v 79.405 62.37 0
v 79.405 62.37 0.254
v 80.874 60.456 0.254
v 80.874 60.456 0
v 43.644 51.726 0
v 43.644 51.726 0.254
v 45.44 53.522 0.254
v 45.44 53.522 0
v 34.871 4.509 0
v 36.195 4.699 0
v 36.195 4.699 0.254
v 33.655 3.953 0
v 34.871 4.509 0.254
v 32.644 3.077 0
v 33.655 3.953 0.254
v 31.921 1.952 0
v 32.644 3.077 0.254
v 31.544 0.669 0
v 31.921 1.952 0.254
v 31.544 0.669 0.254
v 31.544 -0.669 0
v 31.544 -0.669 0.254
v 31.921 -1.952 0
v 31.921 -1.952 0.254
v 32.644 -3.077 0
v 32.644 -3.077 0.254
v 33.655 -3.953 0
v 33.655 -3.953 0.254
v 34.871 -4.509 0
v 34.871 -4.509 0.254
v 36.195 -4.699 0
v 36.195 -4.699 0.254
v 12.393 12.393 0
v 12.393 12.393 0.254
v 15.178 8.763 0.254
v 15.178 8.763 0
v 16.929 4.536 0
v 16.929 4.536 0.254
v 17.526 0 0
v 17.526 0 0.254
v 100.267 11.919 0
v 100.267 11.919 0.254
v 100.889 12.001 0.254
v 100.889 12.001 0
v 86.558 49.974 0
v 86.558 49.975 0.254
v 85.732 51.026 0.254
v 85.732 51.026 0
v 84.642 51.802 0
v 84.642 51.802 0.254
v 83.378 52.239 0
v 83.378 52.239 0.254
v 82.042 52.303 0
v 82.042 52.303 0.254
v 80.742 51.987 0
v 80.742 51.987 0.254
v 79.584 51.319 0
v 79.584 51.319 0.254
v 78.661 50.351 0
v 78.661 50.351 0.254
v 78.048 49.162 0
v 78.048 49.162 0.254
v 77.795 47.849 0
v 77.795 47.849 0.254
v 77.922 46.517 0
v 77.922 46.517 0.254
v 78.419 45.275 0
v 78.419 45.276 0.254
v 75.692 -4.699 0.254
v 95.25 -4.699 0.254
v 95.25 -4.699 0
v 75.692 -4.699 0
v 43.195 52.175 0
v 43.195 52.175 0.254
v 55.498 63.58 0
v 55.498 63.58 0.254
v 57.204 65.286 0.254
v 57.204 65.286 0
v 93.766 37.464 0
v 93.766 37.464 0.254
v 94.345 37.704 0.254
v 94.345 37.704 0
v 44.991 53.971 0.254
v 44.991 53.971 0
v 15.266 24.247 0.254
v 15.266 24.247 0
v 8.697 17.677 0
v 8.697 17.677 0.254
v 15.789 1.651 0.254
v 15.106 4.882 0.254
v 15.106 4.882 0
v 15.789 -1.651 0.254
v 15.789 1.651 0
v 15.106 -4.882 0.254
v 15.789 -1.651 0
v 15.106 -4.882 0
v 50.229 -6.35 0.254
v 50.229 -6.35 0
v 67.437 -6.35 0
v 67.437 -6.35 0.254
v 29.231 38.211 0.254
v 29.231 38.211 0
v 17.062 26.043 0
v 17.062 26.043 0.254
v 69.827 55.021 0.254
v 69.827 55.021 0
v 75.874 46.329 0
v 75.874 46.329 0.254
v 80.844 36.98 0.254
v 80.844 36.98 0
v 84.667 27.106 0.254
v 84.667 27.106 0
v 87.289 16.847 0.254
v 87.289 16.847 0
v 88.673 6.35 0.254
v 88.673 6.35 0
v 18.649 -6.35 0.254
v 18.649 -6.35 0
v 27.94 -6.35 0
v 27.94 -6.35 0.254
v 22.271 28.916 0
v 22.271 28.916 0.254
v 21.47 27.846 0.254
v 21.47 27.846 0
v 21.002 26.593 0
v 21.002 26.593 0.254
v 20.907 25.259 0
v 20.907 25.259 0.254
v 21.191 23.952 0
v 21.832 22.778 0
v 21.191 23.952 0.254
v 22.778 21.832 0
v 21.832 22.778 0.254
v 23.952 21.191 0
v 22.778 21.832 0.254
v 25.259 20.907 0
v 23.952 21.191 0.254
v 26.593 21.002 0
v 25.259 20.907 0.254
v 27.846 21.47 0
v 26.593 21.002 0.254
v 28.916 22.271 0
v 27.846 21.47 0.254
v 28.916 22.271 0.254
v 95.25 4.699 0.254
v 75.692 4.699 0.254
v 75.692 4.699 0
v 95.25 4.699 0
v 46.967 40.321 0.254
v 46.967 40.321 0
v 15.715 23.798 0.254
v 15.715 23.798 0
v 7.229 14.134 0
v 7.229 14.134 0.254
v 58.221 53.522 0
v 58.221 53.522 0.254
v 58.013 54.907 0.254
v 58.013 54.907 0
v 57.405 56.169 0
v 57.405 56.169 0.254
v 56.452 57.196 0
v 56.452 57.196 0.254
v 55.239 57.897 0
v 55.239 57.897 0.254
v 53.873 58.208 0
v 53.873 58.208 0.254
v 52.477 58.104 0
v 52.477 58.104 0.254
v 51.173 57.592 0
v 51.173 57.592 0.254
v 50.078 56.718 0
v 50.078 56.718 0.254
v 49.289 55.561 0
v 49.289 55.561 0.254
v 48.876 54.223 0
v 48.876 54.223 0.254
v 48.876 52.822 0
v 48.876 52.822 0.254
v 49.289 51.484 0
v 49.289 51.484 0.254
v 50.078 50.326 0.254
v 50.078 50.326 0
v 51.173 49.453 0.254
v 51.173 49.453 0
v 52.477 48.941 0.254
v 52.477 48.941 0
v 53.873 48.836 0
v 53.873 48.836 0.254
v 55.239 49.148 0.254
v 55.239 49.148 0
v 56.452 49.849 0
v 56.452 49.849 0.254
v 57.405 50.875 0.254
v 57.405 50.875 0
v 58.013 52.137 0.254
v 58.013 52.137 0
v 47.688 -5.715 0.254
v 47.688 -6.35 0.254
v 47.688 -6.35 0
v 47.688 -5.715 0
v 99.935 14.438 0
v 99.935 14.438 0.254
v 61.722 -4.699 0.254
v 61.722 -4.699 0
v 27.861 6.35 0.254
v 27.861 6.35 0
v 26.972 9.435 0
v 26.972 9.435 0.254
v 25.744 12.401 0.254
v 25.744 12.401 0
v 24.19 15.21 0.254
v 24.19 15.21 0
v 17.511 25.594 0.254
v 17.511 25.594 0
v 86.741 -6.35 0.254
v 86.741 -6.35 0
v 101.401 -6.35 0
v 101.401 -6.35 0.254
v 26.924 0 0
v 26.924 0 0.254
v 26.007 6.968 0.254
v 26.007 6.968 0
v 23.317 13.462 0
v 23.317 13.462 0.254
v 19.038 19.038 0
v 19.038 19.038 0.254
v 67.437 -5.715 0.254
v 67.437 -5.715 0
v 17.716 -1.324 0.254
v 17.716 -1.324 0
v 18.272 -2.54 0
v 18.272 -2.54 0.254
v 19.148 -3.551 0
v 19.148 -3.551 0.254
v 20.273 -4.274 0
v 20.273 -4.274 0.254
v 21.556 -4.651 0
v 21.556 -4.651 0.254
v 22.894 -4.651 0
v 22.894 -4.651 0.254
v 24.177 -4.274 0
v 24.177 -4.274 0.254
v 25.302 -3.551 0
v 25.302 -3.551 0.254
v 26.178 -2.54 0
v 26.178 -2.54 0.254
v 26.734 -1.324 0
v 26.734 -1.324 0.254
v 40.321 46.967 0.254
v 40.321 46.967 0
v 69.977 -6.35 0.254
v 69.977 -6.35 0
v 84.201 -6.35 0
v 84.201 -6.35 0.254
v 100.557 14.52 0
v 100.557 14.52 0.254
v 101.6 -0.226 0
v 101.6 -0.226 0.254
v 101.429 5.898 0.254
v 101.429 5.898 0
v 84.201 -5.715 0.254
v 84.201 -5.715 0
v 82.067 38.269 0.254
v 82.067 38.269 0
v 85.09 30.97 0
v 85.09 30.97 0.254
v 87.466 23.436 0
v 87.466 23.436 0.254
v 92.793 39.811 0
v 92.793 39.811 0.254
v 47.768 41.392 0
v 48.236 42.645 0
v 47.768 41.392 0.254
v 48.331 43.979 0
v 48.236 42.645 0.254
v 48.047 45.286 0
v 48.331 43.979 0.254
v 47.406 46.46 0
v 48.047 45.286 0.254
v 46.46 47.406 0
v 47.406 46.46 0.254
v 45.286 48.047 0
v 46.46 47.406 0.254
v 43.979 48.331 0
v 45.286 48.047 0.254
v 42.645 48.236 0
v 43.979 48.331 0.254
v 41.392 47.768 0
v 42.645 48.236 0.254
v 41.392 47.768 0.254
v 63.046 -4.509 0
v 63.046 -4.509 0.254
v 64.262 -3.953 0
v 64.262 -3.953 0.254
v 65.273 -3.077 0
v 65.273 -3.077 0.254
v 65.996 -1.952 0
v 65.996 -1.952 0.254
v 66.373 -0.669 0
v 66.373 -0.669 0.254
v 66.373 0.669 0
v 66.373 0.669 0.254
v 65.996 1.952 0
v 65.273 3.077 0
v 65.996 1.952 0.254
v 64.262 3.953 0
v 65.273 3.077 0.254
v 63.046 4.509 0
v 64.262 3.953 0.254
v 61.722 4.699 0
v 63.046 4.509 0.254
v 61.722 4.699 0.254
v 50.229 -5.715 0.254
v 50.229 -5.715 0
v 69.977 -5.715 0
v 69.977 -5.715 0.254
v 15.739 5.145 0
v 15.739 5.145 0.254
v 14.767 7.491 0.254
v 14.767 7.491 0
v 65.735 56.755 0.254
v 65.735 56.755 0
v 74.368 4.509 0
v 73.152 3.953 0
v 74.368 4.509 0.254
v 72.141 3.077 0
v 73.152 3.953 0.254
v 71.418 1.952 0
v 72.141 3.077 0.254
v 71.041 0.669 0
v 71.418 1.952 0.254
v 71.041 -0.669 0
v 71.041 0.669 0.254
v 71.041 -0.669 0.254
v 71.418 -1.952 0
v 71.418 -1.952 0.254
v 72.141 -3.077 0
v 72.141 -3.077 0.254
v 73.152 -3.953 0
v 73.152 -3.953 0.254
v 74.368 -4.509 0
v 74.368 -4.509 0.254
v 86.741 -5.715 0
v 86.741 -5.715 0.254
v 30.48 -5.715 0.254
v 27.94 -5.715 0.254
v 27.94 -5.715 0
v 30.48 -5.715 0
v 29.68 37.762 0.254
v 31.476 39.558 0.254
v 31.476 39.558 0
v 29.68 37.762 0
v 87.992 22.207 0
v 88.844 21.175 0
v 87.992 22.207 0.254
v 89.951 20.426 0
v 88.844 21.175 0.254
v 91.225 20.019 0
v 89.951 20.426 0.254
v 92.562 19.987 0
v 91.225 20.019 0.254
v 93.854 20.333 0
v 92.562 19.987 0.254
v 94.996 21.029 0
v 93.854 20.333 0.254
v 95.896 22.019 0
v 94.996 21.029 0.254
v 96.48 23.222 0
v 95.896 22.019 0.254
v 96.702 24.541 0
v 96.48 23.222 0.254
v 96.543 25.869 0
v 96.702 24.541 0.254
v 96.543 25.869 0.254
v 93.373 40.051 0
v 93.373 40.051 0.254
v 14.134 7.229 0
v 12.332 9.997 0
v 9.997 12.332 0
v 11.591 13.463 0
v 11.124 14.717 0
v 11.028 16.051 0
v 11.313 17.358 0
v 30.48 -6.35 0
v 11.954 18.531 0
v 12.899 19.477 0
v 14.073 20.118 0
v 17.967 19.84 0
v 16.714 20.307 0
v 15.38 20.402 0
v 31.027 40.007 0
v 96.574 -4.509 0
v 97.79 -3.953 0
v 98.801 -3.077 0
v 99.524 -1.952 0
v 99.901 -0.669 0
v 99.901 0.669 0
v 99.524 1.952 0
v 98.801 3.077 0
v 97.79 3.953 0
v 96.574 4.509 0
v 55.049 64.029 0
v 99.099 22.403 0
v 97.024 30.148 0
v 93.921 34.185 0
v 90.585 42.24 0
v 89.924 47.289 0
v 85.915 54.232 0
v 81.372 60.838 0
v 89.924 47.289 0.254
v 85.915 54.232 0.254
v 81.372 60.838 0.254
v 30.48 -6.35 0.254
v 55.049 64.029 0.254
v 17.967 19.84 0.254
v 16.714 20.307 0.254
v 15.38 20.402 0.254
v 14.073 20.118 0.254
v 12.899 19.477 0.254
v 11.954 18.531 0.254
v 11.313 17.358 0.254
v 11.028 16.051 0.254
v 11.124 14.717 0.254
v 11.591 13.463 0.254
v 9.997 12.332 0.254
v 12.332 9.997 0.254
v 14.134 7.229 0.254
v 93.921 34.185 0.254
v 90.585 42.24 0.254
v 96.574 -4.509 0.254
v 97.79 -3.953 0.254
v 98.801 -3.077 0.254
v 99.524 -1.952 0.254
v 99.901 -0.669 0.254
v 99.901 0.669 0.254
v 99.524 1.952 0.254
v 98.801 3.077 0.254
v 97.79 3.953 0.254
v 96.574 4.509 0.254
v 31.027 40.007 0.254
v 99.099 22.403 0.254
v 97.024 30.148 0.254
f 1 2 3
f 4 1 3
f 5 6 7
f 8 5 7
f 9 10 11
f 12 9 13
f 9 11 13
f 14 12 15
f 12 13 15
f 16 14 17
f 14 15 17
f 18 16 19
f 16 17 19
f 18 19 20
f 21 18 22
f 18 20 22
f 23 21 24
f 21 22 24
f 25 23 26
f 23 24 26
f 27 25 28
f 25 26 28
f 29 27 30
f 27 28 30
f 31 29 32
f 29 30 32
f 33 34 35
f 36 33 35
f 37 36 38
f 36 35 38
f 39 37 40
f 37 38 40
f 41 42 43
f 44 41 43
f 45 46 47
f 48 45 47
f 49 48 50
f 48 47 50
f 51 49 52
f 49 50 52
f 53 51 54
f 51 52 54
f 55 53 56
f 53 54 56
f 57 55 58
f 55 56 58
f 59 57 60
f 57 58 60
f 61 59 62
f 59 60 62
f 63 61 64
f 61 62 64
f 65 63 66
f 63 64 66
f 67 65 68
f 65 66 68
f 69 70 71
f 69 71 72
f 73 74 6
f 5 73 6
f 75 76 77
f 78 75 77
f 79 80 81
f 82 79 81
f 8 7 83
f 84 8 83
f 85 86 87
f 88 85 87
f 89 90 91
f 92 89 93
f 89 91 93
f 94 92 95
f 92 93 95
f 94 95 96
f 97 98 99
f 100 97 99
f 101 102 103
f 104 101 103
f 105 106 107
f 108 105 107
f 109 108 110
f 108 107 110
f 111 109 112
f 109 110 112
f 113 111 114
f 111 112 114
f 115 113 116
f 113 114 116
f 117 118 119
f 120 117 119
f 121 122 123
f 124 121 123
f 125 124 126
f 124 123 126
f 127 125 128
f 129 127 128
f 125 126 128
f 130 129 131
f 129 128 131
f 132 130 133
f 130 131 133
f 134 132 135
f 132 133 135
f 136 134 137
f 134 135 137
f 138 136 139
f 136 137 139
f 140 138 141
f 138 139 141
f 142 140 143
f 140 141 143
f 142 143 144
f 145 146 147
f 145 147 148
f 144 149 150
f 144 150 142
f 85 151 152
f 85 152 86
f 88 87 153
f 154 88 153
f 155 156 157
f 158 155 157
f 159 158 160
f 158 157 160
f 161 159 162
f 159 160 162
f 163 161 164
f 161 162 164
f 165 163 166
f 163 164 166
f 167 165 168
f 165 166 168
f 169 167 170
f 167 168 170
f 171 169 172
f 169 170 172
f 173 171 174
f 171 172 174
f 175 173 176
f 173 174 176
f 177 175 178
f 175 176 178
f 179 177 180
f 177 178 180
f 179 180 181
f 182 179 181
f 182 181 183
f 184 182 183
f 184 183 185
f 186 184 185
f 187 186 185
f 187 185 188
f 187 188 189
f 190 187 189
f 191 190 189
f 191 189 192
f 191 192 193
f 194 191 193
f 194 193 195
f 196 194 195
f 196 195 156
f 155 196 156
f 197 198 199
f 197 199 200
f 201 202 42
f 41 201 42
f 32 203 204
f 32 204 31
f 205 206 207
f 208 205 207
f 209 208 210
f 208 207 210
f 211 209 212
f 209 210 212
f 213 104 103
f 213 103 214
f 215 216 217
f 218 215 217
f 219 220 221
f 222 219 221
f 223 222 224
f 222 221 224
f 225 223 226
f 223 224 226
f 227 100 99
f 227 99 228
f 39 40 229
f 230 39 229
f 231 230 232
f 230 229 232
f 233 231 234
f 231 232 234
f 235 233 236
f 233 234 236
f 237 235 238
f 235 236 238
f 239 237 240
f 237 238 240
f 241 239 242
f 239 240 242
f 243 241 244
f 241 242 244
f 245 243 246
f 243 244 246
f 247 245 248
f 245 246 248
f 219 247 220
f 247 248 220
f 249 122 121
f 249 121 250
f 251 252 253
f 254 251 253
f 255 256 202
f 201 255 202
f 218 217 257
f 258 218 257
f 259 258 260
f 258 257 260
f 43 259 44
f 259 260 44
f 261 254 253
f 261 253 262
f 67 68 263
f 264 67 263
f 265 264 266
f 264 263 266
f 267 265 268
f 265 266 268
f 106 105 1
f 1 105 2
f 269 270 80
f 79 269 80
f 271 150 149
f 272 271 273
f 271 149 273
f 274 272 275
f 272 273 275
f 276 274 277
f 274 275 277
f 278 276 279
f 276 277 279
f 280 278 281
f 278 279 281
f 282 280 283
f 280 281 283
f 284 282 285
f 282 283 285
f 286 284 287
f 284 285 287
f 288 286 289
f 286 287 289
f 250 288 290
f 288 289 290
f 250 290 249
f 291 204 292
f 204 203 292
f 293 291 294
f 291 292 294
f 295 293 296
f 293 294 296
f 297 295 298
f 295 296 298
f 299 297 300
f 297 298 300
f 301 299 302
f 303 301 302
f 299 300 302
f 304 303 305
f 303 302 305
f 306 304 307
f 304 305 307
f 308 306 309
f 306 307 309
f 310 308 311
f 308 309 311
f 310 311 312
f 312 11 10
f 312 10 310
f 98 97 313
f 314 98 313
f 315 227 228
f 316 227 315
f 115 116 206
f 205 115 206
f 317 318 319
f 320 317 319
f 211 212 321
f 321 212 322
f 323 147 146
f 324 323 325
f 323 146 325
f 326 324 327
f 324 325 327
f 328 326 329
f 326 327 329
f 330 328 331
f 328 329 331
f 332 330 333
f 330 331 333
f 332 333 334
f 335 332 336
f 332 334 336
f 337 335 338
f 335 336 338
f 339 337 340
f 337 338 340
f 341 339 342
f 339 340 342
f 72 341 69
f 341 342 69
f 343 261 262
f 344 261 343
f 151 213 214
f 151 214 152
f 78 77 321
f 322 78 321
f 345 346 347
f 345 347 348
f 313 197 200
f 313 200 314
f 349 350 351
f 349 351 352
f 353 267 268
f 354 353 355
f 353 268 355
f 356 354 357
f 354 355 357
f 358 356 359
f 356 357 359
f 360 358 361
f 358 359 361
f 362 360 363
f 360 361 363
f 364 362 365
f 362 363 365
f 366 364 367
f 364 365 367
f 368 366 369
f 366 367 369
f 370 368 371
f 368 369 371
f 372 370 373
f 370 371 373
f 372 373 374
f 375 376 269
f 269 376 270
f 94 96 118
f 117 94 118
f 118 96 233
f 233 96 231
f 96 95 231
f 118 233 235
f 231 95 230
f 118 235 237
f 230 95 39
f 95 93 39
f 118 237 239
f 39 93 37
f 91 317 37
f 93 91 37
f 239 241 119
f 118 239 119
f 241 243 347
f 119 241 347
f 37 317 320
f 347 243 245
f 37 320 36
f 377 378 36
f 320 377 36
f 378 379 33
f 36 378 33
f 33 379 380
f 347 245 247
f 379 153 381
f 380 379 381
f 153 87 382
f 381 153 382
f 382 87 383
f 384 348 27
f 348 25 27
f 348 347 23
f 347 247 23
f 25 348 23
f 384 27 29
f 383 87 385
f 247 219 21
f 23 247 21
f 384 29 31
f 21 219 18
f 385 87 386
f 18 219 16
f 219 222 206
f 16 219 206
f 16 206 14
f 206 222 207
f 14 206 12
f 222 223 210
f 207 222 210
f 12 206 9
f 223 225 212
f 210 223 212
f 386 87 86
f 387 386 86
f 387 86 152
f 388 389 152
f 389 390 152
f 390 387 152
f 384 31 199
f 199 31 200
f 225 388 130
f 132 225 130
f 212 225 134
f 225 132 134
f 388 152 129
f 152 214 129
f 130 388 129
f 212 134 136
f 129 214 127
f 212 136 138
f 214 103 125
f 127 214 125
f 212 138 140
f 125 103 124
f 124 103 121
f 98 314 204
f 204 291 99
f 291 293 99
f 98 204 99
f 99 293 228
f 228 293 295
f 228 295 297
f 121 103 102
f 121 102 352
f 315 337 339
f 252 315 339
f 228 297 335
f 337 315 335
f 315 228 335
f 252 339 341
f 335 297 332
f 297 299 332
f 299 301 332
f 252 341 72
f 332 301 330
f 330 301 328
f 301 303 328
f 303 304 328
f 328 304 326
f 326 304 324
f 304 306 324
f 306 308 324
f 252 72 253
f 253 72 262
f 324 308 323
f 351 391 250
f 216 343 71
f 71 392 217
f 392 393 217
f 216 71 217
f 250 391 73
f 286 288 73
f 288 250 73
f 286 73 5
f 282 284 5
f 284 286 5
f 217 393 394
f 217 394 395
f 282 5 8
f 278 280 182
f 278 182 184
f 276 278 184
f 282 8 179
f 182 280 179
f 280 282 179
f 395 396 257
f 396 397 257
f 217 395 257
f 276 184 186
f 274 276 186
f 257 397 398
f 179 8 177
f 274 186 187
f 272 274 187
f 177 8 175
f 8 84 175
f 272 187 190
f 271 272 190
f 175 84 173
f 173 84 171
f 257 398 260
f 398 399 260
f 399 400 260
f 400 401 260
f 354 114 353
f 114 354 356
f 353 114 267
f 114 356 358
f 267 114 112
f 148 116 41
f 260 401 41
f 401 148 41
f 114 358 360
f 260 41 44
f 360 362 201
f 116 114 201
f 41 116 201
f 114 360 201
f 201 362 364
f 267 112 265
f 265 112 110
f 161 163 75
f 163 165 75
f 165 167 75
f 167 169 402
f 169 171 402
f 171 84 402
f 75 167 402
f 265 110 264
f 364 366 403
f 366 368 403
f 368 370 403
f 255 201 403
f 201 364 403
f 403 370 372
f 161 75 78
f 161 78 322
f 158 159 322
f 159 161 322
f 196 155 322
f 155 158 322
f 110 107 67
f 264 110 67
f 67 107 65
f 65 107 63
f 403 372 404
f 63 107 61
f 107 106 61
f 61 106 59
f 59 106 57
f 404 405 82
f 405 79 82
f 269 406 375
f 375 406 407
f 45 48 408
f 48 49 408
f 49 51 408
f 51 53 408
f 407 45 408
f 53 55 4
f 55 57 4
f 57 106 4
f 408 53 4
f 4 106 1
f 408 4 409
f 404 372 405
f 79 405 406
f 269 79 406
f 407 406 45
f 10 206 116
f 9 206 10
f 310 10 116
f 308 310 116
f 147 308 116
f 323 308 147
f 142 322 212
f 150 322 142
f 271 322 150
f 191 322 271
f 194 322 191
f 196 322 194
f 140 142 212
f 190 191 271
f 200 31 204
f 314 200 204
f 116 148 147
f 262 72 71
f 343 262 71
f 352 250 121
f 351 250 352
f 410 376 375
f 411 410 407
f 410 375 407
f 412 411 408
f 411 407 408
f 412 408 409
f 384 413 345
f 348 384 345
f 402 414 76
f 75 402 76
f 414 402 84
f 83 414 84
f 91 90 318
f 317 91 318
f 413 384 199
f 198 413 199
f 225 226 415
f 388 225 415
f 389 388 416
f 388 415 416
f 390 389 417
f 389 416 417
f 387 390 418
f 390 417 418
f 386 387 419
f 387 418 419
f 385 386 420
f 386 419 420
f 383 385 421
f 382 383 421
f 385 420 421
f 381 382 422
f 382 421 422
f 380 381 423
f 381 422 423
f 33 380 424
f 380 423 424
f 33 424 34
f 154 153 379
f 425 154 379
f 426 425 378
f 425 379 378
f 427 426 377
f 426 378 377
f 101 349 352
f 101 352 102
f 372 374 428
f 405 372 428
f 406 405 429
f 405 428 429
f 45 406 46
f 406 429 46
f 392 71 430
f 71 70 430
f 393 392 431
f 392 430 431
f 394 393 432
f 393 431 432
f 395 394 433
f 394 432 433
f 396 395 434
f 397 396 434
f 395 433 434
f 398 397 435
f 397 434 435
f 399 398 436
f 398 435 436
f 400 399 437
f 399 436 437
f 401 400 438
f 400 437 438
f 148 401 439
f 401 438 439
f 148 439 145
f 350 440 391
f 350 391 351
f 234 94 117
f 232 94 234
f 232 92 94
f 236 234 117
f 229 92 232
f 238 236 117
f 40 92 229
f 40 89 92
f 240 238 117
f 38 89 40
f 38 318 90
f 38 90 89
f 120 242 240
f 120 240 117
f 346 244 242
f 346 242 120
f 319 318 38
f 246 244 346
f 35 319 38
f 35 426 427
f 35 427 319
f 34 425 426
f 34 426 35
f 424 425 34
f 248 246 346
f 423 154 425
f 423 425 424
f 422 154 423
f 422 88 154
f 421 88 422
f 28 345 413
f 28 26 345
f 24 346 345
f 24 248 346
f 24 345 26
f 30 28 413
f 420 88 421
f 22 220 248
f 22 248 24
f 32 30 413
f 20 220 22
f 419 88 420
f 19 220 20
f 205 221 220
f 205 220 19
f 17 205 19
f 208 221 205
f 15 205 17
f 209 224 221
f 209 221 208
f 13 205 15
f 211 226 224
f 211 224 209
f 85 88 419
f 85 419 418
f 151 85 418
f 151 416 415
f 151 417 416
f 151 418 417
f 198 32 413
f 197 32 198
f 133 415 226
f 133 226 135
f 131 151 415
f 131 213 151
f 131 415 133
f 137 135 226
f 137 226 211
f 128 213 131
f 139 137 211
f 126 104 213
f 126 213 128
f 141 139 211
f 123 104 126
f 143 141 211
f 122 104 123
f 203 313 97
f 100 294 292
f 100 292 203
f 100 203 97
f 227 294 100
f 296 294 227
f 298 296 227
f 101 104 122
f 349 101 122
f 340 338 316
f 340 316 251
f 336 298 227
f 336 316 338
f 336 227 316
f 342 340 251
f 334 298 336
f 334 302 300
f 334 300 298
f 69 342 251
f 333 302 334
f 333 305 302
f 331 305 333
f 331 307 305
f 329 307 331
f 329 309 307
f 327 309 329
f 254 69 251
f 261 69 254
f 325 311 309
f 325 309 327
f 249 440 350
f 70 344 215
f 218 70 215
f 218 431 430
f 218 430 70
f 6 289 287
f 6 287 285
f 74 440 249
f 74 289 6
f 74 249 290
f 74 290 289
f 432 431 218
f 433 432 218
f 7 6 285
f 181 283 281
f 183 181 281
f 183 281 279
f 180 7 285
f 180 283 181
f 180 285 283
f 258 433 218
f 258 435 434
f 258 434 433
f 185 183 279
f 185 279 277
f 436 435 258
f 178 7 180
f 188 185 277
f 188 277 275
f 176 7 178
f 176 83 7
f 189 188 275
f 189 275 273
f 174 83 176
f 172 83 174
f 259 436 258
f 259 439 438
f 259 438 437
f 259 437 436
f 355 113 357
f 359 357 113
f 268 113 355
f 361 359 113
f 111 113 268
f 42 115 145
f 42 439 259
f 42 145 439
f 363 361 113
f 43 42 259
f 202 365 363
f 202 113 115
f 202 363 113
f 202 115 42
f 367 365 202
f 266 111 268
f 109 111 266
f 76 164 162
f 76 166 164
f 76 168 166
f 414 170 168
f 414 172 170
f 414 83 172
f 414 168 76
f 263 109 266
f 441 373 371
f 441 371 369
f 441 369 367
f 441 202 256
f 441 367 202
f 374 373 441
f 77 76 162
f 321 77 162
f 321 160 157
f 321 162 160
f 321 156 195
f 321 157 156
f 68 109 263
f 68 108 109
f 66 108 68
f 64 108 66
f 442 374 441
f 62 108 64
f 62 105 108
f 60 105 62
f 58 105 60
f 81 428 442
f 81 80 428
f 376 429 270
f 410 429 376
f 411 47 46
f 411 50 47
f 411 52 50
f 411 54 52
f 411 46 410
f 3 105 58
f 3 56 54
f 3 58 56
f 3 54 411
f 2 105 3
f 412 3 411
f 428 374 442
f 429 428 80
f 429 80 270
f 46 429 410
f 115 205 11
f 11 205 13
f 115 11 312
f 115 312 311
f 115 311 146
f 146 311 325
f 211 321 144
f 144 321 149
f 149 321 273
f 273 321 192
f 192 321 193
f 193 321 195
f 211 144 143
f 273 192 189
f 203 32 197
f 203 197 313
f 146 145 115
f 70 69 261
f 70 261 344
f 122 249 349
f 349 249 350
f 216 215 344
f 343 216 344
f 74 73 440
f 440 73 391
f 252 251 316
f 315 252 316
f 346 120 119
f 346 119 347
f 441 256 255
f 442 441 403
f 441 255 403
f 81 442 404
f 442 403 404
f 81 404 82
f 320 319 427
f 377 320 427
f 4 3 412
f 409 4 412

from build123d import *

# Parameters (mm, degrees)
BOSS_EXTRUDE1_DEPTH = 0.254
SKETCH2_R           = 4.699
CUT_EXTRUDE1_DEPTH  = 1.254
SKETCH3_W           = 2.54
SKETCH3_H           = 0.635
CUT_EXTRUDE2_DEPTH  = 1.254
CUT_EXTRUDE4_DEPTH  = 1.254
CUT_EXTRUDE5_DEPTH  = 1.254


with BuildPart() as part:
    # Sketch1 → Boss-Extrude1 (new body)
    with BuildSketch(Plane.XY):
        with BuildLine():
            Line((67.21146711, 76.191723231), (8.696654013, 17.676910134))
            Line((8.696654013, 17.676910134), (7.228954972, 14.133571205))
            ThreePointArc((7.228954972, 14.133571205), (14.666587579, 6.075099489), (15.105587123, -4.88230096))
            Line((15.105587123, -4.88230096), (18.648926052, -6.35))
            Line((18.648926052, -6.35), (101.401368334, -6.35))
            ThreePointArc((101.401368334, -6.35), (93.866160503, 38.880636728), (67.21146711, 76.191723231))
        make_face()
        with BuildLine():
            Line((88.672924278, 6.35), (27.86051193, 6.35))
            ThreePointArc((27.86051193, 6.35), (26.399857642, 10.93517908), (24.190484974, 15.210228852))
            Line((24.190484974, 15.210228852), (67.191354125, 58.211098004))
            ThreePointArc((67.191354125, 58.211098004), (82.13289044, 34.020557137), (88.672924278, 6.35))
        make_face(mode=Mode.SUBTRACT)
    extrude(amount=BOSS_EXTRUDE1_DEPTH)

    # Sketch2 → Cut-Extrude1 (cut, through all)
    with BuildSketch(Plane.XY.offset(0.254)):
        with Locations((22.225, 0)):
            Circle(SKETCH2_R)
        with Locations((36.195, 0)):
            Circle(SKETCH2_R)
        with Locations((61.722, 0)):
            Circle(SKETCH2_R)
        with Locations((75.692, 0)):
            Circle(SKETCH2_R)
        with Locations((95.25, 0)):
            Circle(SKETCH2_R)
        with Locations((15.715448212, 15.715448212)):
            Circle(SKETCH2_R)
        with Locations((25.593729945, 25.593729945)):
            Circle(SKETCH2_R)
        with Locations((43.644044748, 43.644044748)):
            Circle(SKETCH2_R)
        with Locations((53.522326482, 53.522326482)):
            Circle(SKETCH2_R)
        with Locations((92.004434954, 24.652514046)):
            Circle(SKETCH2_R)
        with Locations((82.48891971, 47.625)):
            Circle(SKETCH2_R)
        with Locations((67.351920908, 67.351920908)):
            Circle(SKETCH2_R)
    extrude(amount=-CUT_EXTRUDE1_DEPTH, mode=Mode.SUBTRACT)

    # Sketch3 → Cut-Extrude2 (cut, through all)
    with BuildSketch(Plane.XY.offset(0.254)):
        Polygon((15.266435406, 24.246691527), (17.06248663, 26.042742751), (17.511499436, 25.593729945), (15.715448212, 23.797678721), align=None)
        Polygon((44.991083167, 53.971339288), (43.195031942, 52.175288063), (43.644044748, 51.726275257), (45.440095973, 53.522326482), align=None)
        with Locations((29.21, -6.0325)):
            Rectangle(SKETCH3_W, SKETCH3_H)
        with Locations((68.707, -6.0325)):
            Rectangle(SKETCH3_W, SKETCH3_H)
        Polygon((29.230733674, 38.210989795), (31.026784898, 40.007041019), (31.475797704, 39.558028213), (29.67974648, 37.761976989), align=None)
        Polygon((56.845021246, 65.825277367), (55.048970022, 64.029226143), (55.497982828, 63.580213337), (57.294034052, 65.376264561), align=None)
        with Locations((48.9585, -6.0325)):
            Rectangle(SKETCH3_W, SKETCH3_H)
        with Locations((85.471, -6.0325)):
            Rectangle(SKETCH3_W, SKETCH3_H)
        Polygon((99.935462164, 14.437711971), (100.266998693, 11.919442024), (101.526133667, 12.085210288), (101.194597138, 14.603480236), align=None)
        Polygon((93.765504959, 37.464305742), (94.938831965, 37.950313702), (93.966816047, 40.296967714), (92.793489041, 39.810959755), align=None)
        Polygon((79.327792988, 62.471156422), (80.874047017, 60.456038938), (81.88160576, 61.229165953), (80.33535173, 63.244283437), align=None)
        Polygon((13.593916116, 7.005422516), (14.565932035, 4.658768503), (15.739259041, 5.144776462), (14.767243123, 7.491430475), align=None)
    extrude(amount=-CUT_EXTRUDE2_DEPTH, mode=Mode.SUBTRACT)

    # Sketch6 → Cut-Extrude4 (cut, through all)
    with BuildSketch(Plane.XY.offset(0.254)):
        with BuildLine():
            Line((22.27103518, 28.91642471), (40.321349984, 46.966739513))
            ThreePointArc((40.321349984, 46.966739513), (46.966739513, 46.966739513), (46.966739513, 40.321349984))
            Line((46.966739513, 40.321349984), (28.91642471, 22.27103518))
            ThreePointArc((28.91642471, 22.27103518), (22.27103518, 22.27103518), (22.27103518, 28.91642471))
        make_face()
        with BuildLine():
            Line((61.722, -4.699), (36.195, -4.699))
            ThreePointArc((36.195, -4.699), (31.496, 0), (36.195, 4.699))
            Line((36.195, 4.699), (61.722, 4.699))
            ThreePointArc((61.722, 4.699), (66.421, 0), (61.722, -4.699))
        make_face()
        with BuildLine():
            Line((95.25, -4.699), (75.692, -4.699))
            ThreePointArc((75.692, -4.699), (70.993, 0), (75.692, 4.699))
            Line((75.692, 4.699), (95.25, 4.699))
            ThreePointArc((95.25, 4.699), (99.949, 0), (95.25, -4.699))
        make_face()
        with BuildLine():
            ThreePointArc((26.924, 0), (24.874532533, 10.303368733), (19.038142977, 19.038142977))
            ThreePointArc((19.038142977, 19.038142977), (12.392753447, 19.038142977), (12.392753447, 12.392753447))
            ThreePointArc((12.392753447, 12.392753447), (16.191912687, 6.706909836), (17.526, 0))
            ThreePointArc((17.526, 0), (22.225, -4.699), (26.924, 0))
        make_face()
        with BuildLine():
            ThreePointArc((96.543320412, 25.868704739), (92.340835395, 38.248826381), (86.558373083, 49.9745))
            ThreePointArc((86.558373083, 49.9745), (80.13941971, 51.694453372), (78.419466338, 45.2755))
            ThreePointArc((78.419466338, 45.2755), (83.658215548, 34.652367484), (87.465549496, 23.436323353))
            ThreePointArc((87.465549496, 23.436323353), (93.220625647, 20.113628588), (96.543320412, 25.868704739))
        make_face()
    extrude(amount=-CUT_EXTRUDE4_DEPTH, mode=Mode.SUBTRACT)

    # Sketch5 → Cut-Extrude5 (cut, through all)
    with BuildSketch(Plane.XY.offset(0.254)):
        Polygon((55.857193073, 66.633500418), (68.493252435, 53.997441057), (81.501289898, 63.978859263), (67.351920908, 78.128228253), align=None)
    extrude(amount=-CUT_EXTRUDE5_DEPTH, mode=Mode.SUBTRACT)


solid = part.part
